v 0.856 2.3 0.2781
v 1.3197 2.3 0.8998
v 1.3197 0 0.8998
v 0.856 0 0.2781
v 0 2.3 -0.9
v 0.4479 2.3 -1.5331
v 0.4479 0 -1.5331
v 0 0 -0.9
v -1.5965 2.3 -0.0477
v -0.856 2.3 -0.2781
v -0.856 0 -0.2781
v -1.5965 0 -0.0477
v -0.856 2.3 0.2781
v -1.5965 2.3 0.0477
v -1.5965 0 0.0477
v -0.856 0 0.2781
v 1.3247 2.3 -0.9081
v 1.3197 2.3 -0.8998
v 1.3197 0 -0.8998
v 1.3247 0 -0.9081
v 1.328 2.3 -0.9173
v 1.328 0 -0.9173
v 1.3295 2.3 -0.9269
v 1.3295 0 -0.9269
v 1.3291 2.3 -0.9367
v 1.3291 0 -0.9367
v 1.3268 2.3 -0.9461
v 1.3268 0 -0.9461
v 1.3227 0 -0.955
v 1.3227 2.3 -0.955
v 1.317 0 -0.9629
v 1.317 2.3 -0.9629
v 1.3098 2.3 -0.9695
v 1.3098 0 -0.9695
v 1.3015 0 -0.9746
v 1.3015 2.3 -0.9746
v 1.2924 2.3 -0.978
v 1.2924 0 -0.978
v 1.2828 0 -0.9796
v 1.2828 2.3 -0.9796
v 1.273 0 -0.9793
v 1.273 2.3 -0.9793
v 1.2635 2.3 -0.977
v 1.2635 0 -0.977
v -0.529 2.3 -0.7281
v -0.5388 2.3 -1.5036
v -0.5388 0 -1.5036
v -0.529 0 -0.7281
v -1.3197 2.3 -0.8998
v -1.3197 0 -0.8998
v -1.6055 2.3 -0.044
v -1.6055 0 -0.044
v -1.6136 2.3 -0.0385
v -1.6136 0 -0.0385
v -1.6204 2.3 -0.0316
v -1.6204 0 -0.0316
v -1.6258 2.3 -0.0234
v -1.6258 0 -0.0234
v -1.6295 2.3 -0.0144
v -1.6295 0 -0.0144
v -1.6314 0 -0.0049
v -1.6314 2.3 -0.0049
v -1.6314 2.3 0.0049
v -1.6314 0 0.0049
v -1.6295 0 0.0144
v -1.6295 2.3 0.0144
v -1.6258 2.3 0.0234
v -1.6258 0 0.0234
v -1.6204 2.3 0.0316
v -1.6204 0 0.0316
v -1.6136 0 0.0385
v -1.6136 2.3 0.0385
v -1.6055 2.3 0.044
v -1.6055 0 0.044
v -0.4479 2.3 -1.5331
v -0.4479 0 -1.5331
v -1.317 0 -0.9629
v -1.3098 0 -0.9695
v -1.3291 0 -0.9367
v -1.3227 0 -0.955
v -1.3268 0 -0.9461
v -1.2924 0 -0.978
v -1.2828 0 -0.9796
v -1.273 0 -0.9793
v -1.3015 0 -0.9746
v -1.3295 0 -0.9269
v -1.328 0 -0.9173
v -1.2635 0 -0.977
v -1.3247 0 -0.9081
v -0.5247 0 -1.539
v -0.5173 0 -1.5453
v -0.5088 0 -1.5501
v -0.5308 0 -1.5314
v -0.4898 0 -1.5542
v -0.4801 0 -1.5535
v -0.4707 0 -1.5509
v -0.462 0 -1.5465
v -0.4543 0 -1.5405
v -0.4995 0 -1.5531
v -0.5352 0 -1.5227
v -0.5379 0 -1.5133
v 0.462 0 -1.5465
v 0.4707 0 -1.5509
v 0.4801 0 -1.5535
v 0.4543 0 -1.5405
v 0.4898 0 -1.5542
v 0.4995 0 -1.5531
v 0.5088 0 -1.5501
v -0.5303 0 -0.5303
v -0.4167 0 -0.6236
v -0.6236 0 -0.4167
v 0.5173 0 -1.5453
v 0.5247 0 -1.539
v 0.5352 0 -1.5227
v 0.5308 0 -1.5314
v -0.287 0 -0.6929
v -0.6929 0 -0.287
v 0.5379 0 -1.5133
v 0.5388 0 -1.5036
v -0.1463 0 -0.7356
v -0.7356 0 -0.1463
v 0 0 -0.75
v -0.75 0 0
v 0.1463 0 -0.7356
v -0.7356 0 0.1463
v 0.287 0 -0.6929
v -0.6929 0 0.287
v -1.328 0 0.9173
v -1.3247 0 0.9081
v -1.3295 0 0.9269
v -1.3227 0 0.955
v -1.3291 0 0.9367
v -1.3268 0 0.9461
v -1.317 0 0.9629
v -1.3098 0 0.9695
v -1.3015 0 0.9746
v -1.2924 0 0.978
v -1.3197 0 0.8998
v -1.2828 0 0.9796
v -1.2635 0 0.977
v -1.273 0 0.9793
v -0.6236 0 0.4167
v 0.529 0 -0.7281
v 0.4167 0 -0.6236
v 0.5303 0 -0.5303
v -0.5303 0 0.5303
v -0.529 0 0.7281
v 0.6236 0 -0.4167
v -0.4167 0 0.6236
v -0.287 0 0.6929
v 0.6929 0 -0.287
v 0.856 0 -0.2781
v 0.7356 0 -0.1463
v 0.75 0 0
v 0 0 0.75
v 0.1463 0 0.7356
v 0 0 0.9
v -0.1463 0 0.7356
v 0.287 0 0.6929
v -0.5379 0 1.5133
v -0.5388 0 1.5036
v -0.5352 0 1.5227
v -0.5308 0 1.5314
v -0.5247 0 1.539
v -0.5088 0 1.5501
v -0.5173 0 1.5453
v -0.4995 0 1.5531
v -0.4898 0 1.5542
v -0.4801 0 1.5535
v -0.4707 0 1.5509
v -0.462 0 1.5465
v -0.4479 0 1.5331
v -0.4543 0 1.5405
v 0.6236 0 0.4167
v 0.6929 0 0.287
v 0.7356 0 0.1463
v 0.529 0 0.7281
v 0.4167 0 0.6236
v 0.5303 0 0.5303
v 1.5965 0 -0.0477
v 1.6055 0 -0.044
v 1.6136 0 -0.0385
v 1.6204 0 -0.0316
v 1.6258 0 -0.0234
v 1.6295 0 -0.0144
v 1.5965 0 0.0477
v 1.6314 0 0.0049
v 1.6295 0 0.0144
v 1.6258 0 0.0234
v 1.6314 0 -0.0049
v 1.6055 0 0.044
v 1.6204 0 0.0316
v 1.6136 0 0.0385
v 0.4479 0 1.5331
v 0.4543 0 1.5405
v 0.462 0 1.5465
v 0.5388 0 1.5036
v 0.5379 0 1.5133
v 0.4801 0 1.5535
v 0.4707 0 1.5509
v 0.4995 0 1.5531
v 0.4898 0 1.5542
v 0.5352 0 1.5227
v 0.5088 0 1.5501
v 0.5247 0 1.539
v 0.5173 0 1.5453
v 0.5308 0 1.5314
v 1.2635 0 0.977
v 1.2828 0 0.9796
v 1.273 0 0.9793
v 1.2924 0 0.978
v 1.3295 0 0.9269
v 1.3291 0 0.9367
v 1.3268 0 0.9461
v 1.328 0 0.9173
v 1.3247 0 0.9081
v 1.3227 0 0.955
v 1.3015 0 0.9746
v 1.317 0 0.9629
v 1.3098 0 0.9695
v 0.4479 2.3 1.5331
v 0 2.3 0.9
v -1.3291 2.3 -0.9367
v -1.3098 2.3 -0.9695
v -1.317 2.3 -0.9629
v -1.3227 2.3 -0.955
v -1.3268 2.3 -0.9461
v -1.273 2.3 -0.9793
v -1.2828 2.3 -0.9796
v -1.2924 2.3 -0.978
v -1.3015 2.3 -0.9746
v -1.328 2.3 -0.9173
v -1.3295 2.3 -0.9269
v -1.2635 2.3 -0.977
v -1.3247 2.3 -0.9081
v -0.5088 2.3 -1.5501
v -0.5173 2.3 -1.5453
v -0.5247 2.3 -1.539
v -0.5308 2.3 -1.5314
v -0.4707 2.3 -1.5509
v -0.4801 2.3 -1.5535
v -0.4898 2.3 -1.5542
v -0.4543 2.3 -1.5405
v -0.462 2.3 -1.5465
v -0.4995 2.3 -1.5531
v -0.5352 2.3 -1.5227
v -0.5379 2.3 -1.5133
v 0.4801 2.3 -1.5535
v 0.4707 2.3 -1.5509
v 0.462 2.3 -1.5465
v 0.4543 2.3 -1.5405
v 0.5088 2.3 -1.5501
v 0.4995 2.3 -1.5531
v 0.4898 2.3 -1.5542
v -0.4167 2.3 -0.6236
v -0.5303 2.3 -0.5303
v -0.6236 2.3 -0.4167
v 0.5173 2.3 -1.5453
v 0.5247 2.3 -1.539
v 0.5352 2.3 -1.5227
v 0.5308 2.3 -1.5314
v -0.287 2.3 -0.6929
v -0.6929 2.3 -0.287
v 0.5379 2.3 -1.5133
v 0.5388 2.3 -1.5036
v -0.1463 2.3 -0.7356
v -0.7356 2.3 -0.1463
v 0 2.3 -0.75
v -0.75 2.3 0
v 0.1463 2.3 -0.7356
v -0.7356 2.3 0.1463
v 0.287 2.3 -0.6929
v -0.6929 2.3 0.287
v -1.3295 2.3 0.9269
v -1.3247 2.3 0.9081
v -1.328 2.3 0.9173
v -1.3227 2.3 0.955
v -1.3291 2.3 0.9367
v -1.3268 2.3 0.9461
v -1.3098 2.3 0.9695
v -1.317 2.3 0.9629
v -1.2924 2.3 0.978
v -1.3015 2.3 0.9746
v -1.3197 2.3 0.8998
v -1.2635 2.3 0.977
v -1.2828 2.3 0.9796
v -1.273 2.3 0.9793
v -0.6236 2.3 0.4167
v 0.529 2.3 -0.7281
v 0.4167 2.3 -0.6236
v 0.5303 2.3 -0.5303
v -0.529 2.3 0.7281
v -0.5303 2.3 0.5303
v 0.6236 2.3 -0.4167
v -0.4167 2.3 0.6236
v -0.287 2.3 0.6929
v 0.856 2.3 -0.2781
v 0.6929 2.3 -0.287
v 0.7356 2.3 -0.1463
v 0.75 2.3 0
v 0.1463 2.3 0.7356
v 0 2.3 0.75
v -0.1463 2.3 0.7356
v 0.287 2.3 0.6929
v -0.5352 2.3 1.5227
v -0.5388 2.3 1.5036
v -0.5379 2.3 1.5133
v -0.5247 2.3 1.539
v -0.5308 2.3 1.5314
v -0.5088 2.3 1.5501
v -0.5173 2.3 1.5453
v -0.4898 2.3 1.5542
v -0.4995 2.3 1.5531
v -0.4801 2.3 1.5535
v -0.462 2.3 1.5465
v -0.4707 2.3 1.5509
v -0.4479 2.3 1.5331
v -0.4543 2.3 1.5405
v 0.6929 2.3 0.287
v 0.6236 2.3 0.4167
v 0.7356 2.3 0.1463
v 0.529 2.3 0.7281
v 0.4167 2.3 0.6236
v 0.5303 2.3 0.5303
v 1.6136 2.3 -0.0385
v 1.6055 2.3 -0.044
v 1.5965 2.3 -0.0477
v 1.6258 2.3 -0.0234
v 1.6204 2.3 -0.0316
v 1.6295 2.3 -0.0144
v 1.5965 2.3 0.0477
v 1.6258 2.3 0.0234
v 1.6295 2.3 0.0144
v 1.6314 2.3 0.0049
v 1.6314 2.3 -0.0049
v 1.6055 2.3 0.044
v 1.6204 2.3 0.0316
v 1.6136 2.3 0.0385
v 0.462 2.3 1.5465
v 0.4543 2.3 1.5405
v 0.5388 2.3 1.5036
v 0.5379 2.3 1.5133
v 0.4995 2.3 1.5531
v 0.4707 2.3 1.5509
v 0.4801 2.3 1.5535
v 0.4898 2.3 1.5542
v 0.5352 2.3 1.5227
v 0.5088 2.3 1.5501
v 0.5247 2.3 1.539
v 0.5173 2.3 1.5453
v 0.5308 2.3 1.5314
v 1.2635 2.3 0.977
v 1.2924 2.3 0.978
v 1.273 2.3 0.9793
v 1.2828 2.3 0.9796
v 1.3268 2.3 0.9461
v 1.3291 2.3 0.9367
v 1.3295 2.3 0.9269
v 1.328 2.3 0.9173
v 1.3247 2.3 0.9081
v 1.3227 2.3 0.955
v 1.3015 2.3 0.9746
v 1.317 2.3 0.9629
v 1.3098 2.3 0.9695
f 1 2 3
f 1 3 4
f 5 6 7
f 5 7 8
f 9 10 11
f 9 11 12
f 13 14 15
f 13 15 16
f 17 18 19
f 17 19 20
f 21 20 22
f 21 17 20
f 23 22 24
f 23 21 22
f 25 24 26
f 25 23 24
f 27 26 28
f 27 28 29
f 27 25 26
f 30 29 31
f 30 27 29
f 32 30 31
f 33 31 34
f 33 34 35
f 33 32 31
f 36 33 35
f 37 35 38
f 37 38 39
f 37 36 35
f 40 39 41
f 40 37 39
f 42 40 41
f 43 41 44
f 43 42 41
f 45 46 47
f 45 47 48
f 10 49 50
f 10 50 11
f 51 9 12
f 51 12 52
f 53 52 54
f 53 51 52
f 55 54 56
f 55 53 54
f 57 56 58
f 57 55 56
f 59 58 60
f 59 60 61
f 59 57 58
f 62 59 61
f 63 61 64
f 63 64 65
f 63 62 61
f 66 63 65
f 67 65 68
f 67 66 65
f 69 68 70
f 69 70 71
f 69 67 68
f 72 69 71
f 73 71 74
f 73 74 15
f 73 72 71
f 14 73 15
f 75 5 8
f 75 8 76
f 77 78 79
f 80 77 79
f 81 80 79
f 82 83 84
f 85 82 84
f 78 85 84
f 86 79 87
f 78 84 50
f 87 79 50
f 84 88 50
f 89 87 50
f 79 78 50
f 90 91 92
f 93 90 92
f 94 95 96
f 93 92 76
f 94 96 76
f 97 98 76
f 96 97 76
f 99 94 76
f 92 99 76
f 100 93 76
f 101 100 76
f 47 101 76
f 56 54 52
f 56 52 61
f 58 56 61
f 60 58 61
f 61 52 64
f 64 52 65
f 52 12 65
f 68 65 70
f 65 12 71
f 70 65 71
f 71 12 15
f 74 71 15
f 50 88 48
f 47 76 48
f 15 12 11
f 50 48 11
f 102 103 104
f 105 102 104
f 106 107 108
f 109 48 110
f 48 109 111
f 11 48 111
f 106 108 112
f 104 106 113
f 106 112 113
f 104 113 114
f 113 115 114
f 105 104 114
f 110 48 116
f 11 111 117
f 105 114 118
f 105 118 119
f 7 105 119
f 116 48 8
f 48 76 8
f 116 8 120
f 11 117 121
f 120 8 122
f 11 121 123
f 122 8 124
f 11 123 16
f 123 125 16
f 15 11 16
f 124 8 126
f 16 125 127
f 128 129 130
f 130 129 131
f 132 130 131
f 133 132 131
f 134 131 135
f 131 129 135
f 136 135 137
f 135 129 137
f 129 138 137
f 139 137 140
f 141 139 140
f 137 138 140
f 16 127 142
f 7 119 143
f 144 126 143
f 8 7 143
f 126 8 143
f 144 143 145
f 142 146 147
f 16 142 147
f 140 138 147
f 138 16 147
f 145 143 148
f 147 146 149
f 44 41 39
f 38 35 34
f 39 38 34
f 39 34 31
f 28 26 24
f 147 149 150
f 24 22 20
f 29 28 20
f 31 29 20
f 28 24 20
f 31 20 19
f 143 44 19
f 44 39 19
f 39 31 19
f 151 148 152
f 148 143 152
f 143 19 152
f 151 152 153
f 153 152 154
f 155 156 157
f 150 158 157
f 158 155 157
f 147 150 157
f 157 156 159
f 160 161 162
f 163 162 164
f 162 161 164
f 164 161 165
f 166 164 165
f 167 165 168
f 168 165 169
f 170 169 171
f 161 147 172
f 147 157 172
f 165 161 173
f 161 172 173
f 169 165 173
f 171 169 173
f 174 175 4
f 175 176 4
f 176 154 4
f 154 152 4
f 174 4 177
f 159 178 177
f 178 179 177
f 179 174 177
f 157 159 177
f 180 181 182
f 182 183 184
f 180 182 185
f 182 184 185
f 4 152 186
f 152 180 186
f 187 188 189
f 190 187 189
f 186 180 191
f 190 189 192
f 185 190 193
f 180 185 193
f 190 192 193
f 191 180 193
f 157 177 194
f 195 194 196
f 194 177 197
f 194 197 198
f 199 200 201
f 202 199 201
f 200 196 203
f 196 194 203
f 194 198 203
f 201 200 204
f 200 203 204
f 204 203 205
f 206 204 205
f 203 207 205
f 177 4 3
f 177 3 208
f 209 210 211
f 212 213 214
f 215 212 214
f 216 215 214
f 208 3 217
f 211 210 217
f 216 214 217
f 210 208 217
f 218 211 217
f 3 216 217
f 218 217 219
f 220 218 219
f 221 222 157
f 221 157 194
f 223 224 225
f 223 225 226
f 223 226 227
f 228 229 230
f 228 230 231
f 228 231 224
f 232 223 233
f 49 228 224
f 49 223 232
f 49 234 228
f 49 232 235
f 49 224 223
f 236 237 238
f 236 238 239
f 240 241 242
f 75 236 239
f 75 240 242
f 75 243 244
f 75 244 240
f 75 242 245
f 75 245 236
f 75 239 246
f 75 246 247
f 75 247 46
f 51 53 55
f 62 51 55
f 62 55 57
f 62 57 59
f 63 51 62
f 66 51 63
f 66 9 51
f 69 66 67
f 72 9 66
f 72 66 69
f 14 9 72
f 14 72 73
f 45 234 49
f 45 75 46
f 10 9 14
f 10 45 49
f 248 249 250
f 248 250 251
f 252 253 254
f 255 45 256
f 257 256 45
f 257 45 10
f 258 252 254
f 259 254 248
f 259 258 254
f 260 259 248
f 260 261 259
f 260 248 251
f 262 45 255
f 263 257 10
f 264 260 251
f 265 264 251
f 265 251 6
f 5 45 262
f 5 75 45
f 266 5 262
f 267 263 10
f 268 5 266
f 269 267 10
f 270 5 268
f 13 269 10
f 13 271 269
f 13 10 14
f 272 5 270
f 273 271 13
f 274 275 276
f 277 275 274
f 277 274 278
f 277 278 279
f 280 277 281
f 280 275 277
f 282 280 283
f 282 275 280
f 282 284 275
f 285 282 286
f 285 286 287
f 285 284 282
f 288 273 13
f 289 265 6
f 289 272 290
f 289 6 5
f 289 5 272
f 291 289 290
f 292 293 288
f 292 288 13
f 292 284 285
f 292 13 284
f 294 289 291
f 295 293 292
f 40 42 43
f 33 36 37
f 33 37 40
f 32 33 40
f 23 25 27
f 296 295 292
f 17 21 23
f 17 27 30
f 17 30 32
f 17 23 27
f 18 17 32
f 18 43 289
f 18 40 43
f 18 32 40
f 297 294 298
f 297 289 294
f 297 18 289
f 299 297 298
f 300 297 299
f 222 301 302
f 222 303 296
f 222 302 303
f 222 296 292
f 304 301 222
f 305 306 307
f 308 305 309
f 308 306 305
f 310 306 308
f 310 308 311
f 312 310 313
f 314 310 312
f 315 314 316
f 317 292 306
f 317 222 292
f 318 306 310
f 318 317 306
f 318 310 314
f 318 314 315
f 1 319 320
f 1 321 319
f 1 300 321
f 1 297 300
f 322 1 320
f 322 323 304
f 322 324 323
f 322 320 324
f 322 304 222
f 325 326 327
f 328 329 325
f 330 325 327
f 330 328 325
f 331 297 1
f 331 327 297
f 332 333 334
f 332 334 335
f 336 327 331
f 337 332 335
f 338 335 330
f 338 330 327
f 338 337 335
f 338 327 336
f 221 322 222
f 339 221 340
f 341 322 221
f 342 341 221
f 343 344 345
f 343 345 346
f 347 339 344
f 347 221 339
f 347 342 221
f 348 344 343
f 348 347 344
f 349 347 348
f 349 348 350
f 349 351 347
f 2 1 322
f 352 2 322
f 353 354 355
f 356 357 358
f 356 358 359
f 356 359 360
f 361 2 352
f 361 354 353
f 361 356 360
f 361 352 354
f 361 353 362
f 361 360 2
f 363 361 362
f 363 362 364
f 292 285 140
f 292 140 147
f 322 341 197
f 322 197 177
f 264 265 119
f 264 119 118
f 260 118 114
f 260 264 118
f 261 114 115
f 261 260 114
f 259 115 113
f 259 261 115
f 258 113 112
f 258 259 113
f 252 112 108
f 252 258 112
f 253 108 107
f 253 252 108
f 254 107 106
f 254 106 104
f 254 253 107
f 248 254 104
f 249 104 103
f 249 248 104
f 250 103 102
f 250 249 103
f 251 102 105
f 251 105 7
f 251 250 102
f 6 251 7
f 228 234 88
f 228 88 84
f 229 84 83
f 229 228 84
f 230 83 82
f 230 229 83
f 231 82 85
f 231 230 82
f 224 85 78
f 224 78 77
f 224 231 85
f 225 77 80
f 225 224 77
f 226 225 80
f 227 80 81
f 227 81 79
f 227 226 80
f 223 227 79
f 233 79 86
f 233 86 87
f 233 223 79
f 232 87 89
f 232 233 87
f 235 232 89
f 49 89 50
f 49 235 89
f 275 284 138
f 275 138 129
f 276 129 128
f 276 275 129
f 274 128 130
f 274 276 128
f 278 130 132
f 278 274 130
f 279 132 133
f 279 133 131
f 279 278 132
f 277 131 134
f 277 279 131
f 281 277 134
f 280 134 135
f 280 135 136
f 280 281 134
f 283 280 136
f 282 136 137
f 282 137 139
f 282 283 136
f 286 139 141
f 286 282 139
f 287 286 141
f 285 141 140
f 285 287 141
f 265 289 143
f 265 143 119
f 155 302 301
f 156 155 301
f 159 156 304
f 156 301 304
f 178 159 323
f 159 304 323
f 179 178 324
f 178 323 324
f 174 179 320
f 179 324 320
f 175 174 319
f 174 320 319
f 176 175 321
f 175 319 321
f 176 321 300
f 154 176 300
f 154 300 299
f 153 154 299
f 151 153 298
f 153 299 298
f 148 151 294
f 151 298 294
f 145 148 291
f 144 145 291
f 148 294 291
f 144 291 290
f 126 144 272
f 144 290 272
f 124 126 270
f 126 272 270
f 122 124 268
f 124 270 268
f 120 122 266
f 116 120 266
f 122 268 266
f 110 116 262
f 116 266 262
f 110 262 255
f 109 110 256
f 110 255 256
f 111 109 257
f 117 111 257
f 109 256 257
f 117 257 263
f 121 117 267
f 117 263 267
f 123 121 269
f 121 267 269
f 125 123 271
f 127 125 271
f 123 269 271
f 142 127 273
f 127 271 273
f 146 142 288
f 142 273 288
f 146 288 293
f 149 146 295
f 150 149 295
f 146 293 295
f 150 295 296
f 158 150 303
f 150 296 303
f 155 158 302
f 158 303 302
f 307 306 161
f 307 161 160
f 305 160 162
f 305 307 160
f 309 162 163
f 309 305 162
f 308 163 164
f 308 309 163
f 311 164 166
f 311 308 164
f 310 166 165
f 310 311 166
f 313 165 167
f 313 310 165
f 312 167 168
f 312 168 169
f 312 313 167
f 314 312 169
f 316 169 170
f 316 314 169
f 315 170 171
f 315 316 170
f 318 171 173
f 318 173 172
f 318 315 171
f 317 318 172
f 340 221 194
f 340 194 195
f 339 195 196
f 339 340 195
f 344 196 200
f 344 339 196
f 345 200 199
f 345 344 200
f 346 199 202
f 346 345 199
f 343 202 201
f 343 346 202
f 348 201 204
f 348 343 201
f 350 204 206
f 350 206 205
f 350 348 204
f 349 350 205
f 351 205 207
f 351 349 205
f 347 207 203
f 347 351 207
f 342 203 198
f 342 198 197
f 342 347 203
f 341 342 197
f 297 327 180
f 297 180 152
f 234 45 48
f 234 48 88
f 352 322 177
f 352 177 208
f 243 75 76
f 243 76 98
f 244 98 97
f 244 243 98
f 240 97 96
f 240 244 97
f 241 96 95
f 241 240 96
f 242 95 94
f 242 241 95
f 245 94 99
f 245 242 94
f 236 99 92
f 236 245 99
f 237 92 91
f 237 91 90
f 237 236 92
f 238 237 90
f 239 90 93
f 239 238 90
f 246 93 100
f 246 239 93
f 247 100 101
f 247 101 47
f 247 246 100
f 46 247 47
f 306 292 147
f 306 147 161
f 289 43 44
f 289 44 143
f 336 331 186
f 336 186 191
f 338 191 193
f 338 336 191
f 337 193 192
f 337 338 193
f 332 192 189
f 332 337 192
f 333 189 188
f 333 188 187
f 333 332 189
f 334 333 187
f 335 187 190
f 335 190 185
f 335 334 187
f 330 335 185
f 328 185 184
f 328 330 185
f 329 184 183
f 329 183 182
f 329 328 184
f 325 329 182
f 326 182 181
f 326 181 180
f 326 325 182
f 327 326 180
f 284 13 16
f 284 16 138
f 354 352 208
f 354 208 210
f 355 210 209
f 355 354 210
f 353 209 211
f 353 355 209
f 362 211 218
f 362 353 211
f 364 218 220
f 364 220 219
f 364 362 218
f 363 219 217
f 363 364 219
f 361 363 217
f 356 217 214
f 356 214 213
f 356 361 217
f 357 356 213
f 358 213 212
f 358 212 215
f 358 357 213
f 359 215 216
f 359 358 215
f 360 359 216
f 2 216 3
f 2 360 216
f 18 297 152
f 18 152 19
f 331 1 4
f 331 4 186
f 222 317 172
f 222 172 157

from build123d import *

# Parameters (mm, degrees)
SKETCH_1_R          = 1.75
EXTRUDE_1_DEPTH     = 2.3
SKETCH_2_OUTSIDE_W  = 6.592
SKETCH_2_OUTSIDE_H  = 6.592
SKETCH_2_OUTSIDE_R  = 0.75
CUT_EXTRUDE_2_DEPTH = 2.3


with BuildPart() as part:
    # 草圖1 → 伸長1 (new body)
    with BuildSketch(Plane(origin=(0, 0, 0), x_dir=(1, 0, 0), z_dir=(0, 1, 0))):
        with Locations(Location((0, 0, 0), (0, 0, 270))):
            Circle(SKETCH_1_R)
    extrude(amount=EXTRUDE_1_DEPTH)

    # 草圖2 outside → 伸長2 (cut)
    # profile 1 of 2: a face of its own
    with BuildSketch(Plane(origin=(0, 2.3, 0), x_dir=(1, 0, 0), z_dir=(0, 1, 0))):
        Rectangle(SKETCH_2_OUTSIDE_W, SKETCH_2_OUTSIDE_H)
        with BuildLine():
            Line((0.529006727, 0.728115295), (0.538758697, 1.503628067))
            ThreePointArc((0.538758697, 1.503628067), (0.504213499, 1.551809586), (0.447945461, 1.533135076))
            Line((0.447945461, 1.533135076), (0, 0.9))
            Line((0, 0.9), (-0.447945461, 1.533135076))
            ThreePointArc((-0.447945461, 1.533135076), (-0.504213499, 1.551809586), (-0.538758697, 1.503628067))
            Line((-0.538758697, 1.503628067), (-0.529006727, 0.728115295))
            Line((-0.529006727, 0.728115295), (-1.263549678, 0.977036595))
            ThreePointArc((-1.263549678, 0.977036595), (-1.320048079, 0.959071069), (-1.319675344, 0.899786243))
            Line((-1.319675344, 0.899786243), (-0.855950865, 0.278115295))
            Line((-0.855950865, 0.278115295), (-1.596520864, 0.047743344))
            ThreePointArc((-1.596520864, 0.047743344), (-1.631669159, 0), (-1.596520864, -0.047743344))
            Line((-1.596520864, -0.047743344), (-0.855950865, -0.278115295))
            Line((-0.855950865, -0.278115295), (-1.319675344, -0.899786243))
            ThreePointArc((-1.319675344, -0.899786243), (-1.320048079, -0.959071069), (-1.263549678, -0.977036595))
            Line((-1.263549678, -0.977036595), (-0.529006727, -0.728115295))
            Line((-0.529006727, -0.728115295), (-0.538758697, -1.503628067))
            ThreePointArc((-0.538758697, -1.503628067), (-0.504213499, -1.551809586), (-0.447945461, -1.533135076))
            Line((-0.447945461, -1.533135076), (0, -0.9))
            Line((0, -0.9), (0.447945461, -1.533135076))
            ThreePointArc((0.447945461, -1.533135076), (0.504213499, -1.551809586), (0.538758697, -1.503628067))
            Line((0.538758697, -1.503628067), (0.529006727, -0.728115295))
            Line((0.529006727, -0.728115295), (1.263549678, -0.977036595))
            ThreePointArc((1.263549678, -0.977036595), (1.320048079, -0.959071069), (1.319675344, -0.899786243))
            Line((1.319675344, -0.899786243), (0.855950865, -0.278115295))
            Line((0.855950865, -0.278115295), (1.596520864, -0.047743344))
            ThreePointArc((1.596520864, -0.047743344), (1.631669159, 0), (1.596520864, 0.047743344))
            Line((1.596520864, 0.047743344), (0.855950865, 0.278115295))
            Line((0.855950865, 0.278115295), (1.319675344, 0.899786243))
            ThreePointArc((1.319675344, 0.899786243), (1.320048079, 0.959071069), (1.263549678, 0.977036595))
            Line((1.263549678, 0.977036595), (0.529006727, 0.728115295))
        make_face(mode=Mode.SUBTRACT)
    # profile 2 of 2: a face of its own
    with BuildSketch(Plane(origin=(0, 2.3, 0), x_dir=(1, 0, 0), z_dir=(0, 1, 0))):
        with Locations(Location((0, 0, 0), (0, 0, 270))):
            Circle(SKETCH_2_OUTSIDE_R)
    extrude(amount=-CUT_EXTRUDE_2_DEPTH, mode=Mode.SUBTRACT)


solid = part.part
